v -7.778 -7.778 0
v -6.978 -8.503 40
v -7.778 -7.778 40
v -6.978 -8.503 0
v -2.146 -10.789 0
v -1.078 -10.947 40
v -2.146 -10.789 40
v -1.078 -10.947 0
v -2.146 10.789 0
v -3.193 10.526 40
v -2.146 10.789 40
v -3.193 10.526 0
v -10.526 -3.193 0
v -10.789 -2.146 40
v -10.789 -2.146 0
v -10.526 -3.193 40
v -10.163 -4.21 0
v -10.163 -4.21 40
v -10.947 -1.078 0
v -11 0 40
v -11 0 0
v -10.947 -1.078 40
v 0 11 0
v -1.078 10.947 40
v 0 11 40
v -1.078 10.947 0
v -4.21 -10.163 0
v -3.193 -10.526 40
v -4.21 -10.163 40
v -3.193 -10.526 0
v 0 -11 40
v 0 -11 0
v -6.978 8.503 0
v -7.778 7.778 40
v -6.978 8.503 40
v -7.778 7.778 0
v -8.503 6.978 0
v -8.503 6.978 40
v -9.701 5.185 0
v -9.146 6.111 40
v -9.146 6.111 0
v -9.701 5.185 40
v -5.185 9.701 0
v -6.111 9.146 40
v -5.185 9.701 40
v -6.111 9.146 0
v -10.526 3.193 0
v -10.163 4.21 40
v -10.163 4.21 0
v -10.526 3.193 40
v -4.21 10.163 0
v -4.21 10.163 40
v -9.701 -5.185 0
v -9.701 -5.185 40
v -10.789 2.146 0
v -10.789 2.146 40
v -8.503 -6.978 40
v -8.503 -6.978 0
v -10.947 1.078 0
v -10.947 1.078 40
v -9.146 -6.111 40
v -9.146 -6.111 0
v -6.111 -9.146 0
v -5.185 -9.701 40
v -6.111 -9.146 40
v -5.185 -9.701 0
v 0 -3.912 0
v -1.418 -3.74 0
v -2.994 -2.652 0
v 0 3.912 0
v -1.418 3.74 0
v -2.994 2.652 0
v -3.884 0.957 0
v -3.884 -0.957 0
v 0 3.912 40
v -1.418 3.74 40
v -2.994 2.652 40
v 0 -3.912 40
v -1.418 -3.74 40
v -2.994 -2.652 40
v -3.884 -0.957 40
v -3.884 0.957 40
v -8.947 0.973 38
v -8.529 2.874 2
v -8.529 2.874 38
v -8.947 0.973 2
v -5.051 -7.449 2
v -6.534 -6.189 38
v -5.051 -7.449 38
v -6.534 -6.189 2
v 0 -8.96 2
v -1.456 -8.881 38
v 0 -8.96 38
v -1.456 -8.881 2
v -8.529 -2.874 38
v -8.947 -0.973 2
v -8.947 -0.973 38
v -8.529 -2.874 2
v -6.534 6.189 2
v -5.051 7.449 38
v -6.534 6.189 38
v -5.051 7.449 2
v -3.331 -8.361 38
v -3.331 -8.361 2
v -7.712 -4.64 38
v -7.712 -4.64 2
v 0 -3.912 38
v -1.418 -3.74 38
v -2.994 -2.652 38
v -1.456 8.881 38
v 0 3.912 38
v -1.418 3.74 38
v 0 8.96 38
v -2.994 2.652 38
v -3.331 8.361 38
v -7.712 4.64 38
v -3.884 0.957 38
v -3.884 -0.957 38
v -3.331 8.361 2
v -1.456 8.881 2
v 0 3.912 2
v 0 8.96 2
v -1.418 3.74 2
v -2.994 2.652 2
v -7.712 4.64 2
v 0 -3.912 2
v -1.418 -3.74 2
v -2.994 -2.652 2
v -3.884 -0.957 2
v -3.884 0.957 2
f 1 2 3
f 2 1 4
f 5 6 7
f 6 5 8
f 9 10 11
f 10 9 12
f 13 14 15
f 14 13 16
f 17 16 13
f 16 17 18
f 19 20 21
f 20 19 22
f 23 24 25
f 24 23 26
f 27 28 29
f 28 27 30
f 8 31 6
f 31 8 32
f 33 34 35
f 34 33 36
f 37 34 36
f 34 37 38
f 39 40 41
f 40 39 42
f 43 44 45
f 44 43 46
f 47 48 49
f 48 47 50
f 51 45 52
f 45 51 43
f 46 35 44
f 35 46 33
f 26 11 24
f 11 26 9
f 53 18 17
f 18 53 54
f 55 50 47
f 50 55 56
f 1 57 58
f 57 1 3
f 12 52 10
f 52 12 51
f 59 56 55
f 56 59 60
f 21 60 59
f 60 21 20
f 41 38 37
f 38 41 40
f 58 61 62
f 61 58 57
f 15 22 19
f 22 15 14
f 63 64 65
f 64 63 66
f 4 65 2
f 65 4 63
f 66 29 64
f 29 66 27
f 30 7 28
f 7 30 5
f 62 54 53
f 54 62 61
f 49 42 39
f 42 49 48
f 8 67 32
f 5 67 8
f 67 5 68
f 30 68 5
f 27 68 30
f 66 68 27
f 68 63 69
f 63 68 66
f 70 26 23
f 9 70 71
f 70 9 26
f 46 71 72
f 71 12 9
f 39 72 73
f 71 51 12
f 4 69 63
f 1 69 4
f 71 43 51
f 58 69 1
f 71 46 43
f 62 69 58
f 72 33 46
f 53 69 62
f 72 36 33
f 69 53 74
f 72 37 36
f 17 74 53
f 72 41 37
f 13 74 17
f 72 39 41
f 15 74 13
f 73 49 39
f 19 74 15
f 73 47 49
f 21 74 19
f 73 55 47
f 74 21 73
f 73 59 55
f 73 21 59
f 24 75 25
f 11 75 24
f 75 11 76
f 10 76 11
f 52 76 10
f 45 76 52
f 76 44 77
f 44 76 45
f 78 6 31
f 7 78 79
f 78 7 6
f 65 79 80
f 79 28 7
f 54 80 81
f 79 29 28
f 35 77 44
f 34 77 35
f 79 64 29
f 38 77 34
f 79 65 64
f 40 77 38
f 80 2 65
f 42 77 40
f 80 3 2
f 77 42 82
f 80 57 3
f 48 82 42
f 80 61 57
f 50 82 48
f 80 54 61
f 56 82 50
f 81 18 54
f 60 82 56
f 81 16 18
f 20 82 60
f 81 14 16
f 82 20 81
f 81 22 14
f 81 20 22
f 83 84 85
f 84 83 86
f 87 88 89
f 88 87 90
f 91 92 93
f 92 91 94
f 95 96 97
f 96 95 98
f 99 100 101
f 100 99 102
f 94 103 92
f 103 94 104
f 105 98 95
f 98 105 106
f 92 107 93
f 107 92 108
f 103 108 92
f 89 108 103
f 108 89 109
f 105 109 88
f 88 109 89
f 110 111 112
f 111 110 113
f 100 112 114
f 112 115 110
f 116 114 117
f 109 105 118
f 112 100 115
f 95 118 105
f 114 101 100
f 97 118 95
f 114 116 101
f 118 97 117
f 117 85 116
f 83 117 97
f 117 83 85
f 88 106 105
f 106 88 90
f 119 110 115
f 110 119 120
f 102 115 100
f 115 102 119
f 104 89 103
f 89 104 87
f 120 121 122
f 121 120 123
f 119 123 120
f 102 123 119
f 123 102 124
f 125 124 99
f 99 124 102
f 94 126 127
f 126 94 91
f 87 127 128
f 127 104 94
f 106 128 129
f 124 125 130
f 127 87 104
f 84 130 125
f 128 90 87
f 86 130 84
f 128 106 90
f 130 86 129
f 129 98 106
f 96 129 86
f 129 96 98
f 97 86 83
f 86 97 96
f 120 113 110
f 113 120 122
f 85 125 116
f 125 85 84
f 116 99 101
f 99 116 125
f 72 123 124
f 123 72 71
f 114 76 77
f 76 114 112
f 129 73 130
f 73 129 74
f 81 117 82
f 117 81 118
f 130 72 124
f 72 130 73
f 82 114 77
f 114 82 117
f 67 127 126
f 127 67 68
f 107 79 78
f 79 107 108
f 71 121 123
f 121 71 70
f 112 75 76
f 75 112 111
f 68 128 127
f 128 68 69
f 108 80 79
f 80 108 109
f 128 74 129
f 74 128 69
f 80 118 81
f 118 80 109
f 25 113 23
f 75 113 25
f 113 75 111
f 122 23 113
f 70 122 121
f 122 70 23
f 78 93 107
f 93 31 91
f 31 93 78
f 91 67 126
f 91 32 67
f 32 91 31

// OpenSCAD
difference(){
    cylinder(d=22,h=40,$fn=64);
    translate([0,0,2])
    cylinder(d=18,h=40-4);

    translate([0,0,-2])
    cylinder(d=8,h=50);
    
    translate([0,-50,-10])
    cube(100);
}
